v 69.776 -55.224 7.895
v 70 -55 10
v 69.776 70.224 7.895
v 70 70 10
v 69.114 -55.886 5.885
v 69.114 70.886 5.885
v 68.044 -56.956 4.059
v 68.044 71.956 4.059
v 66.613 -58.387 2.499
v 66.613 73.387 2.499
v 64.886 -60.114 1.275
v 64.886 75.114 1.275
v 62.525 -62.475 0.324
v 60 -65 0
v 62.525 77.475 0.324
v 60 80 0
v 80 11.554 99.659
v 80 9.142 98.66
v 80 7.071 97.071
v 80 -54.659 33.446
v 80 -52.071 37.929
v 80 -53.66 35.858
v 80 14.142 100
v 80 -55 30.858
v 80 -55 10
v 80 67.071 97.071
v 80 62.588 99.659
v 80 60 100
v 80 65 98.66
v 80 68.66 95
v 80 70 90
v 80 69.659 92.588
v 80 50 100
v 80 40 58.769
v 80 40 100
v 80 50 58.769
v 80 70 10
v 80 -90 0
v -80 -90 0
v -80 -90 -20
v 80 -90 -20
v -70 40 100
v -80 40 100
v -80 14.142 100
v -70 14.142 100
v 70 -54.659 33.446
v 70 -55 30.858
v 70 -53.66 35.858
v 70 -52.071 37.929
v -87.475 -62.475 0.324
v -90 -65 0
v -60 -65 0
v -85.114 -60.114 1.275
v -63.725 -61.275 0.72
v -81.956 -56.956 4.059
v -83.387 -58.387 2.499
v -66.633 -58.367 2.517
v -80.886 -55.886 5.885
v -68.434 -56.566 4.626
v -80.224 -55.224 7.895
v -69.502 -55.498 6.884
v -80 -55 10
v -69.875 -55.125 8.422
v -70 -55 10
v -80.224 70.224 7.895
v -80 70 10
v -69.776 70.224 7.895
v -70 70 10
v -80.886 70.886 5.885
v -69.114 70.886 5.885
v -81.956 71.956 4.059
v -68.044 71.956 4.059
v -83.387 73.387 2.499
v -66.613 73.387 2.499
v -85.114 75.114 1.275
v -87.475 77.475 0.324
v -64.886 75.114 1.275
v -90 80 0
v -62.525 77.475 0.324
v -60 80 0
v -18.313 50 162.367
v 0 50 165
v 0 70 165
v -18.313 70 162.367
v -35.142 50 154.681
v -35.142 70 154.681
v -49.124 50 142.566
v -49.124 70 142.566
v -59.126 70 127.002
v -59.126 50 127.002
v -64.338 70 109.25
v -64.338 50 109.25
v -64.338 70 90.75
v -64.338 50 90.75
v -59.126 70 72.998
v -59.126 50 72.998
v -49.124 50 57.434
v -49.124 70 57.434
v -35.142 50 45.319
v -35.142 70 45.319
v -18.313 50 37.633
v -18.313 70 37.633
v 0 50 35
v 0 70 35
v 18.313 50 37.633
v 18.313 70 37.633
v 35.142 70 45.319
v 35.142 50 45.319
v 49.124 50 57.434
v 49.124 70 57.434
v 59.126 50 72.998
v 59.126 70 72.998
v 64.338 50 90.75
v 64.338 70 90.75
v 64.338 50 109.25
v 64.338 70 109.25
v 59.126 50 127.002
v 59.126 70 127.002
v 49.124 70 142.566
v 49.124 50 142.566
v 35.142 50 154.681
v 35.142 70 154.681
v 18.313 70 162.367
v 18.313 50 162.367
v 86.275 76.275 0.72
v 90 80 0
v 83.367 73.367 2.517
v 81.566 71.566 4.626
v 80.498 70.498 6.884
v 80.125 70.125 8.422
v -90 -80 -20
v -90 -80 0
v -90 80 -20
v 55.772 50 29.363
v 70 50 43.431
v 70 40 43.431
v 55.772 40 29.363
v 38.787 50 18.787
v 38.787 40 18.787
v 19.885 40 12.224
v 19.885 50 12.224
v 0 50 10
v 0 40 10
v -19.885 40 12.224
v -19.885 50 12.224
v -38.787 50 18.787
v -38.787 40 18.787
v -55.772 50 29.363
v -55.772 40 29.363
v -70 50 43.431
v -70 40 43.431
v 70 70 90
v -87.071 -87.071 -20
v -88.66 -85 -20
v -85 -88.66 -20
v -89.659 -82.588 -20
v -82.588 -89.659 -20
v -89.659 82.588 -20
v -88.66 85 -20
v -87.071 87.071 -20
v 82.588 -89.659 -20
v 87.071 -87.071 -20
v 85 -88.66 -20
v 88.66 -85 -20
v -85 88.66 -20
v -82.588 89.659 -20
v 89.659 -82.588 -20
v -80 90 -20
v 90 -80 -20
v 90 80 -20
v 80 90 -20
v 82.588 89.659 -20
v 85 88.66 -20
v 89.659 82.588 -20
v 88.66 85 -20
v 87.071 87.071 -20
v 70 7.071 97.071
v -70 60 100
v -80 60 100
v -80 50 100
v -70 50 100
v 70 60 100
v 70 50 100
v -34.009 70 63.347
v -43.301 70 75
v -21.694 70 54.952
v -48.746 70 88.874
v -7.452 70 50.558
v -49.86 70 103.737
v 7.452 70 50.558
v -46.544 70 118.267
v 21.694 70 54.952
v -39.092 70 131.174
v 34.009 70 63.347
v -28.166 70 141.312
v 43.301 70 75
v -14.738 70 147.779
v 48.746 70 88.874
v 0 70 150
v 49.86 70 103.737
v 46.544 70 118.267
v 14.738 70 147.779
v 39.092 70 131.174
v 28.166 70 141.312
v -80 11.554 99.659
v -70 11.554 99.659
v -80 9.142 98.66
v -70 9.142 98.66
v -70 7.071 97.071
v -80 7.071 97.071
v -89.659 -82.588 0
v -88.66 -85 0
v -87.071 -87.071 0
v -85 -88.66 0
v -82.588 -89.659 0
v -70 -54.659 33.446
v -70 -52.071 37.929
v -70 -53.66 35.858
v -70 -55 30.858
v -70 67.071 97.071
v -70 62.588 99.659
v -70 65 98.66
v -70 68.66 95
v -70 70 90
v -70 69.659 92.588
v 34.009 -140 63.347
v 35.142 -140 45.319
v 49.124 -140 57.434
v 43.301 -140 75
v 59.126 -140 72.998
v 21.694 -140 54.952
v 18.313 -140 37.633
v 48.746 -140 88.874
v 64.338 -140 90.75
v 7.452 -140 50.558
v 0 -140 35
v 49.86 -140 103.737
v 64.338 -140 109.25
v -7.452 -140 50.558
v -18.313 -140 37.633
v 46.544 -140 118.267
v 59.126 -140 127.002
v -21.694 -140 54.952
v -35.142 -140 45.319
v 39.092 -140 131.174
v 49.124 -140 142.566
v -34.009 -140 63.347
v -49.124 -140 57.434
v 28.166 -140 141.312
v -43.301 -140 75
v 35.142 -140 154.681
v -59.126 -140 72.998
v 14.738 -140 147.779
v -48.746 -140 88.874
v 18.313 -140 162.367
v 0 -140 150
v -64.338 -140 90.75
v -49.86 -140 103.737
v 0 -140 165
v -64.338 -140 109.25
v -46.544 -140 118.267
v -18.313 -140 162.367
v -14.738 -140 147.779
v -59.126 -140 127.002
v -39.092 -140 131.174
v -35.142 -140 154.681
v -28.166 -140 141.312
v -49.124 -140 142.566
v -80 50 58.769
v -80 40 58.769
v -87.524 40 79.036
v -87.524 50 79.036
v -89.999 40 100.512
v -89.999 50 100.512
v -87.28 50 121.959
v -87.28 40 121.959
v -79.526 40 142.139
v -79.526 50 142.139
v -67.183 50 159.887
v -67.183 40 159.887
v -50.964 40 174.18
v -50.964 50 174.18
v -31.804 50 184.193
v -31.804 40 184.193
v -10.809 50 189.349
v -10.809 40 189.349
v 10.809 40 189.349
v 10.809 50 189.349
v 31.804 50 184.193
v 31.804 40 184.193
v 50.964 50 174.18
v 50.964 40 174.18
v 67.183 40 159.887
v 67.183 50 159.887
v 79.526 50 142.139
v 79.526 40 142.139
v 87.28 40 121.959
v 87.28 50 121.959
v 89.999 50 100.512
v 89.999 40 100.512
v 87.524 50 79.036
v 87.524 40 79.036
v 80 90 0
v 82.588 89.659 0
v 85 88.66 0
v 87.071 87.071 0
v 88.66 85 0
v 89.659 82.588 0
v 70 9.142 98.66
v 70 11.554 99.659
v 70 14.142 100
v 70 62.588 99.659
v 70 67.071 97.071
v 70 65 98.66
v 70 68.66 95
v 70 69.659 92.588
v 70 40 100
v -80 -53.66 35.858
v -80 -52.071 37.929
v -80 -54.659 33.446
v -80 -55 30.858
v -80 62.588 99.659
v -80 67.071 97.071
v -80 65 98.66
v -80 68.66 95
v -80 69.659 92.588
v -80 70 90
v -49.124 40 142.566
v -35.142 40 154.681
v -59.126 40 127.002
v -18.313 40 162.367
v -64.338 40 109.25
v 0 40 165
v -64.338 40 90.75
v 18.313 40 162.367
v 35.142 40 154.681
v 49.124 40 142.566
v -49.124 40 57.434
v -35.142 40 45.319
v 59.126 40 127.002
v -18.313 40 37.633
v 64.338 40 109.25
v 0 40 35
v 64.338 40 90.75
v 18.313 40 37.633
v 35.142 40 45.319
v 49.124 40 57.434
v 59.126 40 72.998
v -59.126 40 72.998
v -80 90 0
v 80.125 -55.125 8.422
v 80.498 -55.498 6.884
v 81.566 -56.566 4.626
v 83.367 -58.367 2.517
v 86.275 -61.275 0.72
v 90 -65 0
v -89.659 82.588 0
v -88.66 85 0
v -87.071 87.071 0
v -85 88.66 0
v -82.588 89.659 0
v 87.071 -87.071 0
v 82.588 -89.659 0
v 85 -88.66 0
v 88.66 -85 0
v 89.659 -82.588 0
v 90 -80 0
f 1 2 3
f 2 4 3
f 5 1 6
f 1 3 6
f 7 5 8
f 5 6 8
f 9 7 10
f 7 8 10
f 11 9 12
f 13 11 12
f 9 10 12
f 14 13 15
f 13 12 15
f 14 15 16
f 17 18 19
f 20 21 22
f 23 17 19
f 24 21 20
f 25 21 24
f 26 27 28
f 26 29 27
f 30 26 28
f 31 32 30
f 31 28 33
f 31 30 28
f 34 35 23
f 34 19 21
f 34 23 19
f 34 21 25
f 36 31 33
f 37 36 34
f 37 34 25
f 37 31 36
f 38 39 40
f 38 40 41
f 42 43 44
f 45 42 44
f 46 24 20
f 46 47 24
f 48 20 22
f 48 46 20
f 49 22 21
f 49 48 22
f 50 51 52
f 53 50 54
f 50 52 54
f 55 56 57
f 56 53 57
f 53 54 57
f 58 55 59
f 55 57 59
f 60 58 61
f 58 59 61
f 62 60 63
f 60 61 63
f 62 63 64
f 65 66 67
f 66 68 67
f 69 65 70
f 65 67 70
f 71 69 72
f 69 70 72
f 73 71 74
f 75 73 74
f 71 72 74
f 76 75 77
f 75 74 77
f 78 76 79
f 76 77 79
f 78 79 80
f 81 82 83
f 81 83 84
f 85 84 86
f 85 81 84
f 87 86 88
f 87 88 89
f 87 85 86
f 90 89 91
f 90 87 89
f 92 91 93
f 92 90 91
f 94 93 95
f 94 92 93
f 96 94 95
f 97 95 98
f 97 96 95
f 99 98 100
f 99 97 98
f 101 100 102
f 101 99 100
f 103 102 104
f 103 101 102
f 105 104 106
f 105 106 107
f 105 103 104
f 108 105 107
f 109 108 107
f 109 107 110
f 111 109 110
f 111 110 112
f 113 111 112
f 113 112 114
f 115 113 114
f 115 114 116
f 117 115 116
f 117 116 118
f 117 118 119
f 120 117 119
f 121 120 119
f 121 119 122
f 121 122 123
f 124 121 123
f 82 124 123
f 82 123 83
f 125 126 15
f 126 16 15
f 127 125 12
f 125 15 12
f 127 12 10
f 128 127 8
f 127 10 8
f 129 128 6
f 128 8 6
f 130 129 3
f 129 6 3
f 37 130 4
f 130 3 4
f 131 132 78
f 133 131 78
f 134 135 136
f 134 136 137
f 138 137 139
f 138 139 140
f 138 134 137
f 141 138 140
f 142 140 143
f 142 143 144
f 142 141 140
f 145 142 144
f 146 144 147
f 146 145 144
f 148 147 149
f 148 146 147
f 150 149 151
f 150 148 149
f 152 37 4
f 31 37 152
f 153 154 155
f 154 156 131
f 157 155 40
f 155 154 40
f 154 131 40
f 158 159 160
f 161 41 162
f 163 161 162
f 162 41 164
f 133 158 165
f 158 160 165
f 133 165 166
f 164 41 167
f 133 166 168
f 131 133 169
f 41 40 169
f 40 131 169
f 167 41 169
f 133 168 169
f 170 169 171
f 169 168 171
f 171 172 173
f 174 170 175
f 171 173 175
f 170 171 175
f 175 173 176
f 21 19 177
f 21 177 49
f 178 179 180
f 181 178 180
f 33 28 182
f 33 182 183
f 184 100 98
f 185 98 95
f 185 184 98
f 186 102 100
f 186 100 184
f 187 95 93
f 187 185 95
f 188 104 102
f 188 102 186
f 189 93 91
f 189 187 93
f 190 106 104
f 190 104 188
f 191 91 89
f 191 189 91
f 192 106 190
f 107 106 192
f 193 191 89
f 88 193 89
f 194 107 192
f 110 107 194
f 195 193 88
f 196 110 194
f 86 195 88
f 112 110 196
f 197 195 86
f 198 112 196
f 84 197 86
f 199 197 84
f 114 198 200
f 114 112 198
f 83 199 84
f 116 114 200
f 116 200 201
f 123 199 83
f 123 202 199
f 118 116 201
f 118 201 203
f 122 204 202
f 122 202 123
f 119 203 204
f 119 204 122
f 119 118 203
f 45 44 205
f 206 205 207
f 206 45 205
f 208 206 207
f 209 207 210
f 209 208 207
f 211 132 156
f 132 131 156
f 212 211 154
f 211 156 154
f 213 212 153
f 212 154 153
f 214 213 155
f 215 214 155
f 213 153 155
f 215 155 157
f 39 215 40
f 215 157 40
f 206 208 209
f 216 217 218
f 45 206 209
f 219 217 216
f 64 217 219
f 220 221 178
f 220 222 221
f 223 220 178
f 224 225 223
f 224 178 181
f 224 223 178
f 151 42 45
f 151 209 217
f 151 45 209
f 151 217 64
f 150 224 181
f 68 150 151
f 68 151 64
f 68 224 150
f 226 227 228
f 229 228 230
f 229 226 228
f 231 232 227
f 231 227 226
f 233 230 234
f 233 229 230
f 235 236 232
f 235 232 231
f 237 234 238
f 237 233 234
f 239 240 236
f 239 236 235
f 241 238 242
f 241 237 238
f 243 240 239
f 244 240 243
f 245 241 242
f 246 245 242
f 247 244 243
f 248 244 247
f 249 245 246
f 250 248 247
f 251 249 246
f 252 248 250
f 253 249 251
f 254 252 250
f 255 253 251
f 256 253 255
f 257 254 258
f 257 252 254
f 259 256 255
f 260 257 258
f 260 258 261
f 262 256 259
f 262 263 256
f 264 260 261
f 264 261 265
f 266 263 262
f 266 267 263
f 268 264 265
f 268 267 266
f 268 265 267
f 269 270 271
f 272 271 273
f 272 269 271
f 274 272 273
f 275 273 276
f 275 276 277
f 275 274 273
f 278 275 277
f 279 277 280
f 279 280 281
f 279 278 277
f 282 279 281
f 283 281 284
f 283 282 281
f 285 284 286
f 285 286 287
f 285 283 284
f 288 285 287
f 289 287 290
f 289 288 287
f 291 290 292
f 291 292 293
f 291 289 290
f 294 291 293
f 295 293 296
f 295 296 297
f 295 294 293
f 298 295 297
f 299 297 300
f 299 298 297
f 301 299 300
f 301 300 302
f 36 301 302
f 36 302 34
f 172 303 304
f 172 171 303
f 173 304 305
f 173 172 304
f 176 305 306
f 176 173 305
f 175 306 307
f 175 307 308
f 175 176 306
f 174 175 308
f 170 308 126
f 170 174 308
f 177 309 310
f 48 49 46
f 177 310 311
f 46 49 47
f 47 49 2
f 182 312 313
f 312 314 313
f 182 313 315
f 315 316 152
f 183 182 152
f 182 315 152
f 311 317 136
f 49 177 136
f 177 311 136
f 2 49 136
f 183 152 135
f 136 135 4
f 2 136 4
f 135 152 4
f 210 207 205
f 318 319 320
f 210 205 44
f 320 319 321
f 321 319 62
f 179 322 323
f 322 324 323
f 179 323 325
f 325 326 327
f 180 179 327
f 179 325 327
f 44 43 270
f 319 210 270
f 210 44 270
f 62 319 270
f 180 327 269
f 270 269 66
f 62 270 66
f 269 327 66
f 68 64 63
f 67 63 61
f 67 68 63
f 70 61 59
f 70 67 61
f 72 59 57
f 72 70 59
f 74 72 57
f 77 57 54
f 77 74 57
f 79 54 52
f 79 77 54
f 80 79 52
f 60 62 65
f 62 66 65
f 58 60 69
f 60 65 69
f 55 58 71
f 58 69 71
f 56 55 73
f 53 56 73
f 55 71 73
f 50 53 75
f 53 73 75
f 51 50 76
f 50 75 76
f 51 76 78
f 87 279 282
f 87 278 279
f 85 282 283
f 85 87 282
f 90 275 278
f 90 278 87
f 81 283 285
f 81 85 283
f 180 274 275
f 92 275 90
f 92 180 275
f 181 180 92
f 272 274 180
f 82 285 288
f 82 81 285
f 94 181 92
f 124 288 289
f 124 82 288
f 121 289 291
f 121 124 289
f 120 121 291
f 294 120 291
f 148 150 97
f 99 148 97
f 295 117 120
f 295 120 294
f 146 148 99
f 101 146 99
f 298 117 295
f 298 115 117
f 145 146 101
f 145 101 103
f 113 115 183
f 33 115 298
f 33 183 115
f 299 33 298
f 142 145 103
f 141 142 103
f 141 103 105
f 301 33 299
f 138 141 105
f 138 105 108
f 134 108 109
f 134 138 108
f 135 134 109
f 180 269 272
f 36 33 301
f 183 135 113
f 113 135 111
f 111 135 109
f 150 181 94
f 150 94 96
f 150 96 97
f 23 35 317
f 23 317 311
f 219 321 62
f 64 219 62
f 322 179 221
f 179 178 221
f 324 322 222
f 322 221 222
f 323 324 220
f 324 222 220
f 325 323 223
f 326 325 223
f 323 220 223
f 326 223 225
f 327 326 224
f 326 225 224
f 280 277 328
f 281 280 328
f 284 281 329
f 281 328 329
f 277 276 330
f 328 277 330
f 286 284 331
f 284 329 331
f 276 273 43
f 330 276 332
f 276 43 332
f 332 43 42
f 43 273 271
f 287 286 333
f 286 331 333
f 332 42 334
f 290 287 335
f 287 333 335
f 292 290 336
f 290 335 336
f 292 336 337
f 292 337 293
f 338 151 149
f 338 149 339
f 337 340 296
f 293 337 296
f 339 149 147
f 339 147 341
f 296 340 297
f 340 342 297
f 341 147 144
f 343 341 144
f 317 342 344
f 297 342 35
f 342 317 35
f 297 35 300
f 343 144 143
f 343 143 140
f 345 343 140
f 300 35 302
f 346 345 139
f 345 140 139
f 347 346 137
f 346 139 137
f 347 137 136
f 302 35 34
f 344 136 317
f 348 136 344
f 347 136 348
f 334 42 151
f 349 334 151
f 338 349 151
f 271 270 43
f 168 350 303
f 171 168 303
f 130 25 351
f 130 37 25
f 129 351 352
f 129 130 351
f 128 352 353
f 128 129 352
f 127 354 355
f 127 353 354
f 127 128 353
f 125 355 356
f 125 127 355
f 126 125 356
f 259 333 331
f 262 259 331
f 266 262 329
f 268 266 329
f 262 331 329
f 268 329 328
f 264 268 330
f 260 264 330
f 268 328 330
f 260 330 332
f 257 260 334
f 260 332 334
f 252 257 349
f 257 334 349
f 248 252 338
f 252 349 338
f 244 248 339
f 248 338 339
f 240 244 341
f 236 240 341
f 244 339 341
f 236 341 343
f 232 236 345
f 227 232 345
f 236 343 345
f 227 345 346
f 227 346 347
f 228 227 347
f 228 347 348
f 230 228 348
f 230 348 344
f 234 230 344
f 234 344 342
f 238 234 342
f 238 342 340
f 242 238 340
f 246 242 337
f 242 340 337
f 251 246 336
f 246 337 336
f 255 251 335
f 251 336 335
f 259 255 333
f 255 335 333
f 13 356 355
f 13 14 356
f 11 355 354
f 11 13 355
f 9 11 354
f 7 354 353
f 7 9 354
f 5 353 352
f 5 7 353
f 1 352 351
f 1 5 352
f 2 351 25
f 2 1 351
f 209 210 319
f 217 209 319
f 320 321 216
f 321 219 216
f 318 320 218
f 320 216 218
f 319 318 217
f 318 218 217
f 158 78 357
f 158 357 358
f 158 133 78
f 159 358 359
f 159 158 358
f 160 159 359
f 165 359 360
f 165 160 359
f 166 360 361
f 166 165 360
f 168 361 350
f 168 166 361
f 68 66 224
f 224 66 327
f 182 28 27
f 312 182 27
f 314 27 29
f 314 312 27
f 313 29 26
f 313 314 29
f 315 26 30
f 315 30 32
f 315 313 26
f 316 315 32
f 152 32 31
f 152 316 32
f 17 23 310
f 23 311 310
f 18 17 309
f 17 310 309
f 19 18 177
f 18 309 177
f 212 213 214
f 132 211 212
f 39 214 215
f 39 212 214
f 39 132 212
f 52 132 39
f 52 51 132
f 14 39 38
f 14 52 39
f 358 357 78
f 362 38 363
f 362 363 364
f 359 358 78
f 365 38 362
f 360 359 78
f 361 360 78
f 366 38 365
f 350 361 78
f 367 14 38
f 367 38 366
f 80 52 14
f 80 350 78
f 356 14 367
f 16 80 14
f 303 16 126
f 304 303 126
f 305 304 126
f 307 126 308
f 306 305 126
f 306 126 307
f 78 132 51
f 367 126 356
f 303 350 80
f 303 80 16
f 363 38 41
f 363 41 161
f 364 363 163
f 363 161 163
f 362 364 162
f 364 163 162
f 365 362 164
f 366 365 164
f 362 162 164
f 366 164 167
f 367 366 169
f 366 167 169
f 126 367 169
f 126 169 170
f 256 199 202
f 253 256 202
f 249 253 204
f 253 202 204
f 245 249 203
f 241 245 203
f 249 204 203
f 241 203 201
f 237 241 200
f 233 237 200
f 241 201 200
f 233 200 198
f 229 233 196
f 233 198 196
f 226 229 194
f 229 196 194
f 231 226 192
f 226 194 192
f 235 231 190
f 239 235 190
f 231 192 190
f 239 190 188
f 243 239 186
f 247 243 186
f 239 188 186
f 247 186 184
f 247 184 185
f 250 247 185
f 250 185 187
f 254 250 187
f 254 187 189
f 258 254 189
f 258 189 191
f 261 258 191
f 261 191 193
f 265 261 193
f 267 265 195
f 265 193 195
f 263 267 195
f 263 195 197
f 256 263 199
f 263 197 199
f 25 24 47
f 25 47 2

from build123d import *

# Parameters (mm, degrees)
BASE_SKETCH_W                   = 180
BASE_SKETCH_H                   = 180
BASE_EXTRUDE_DEPTH              = 20
SUPPORT_EXTRUDE_DEPTH           = 10
MOTOR_SUPPORT_SKETCH_R          = 90
MOTOR_SUPPORT_EXTRUDE_DEPTH     = 10
MOTOR_SKETCH_R                  = 65
MOTOR_EXTRUDE_DEPTH             = 180
MOTOR_EXTRUDE_DIRECTION_2_REACH = 249.184
MOTOR_HOLE_SKETCH_R             = 50
MOTOR_HOLE_CUT_DEPTH            = 210
SUPPORT_FILLETS_R               = 10


with BuildPart() as part:
    # Base Sketch → Base Extrude (new body)
    with BuildSketch(Plane.XY):
        Rectangle(BASE_SKETCH_W, BASE_SKETCH_H)
    extrude(amount=-BASE_EXTRUDE_DEPTH)

    # Support Sketch → Support Extrude (add)
    with BuildSketch(Plane(origin=(80, 0, 0), x_dir=(0, 0, -1), z_dir=(1, 0, 0))):
        Polygon((-100, 10), (-35, -55), (0, -55), (0, 70), (-100, 70), align=None)
    support_extrude = extrude(amount=-SUPPORT_EXTRUDE_DEPTH)

    # Support Mirror: Support Extrude across plane
    add(support_extrude.mirror(Plane(origin=(0, 0, 0), x_dir=(0, 0, 1), z_dir=(1, 0, 0))))

    # Motor Support Sketch → Motor Support Extrude (add)
    with BuildSketch(Plane(origin=(0, 50, 0), x_dir=(1, 0, 0), z_dir=(0, 1, 0))):
        with Locations((0, -100)):
            Circle(MOTOR_SUPPORT_SKETCH_R)
    extrude(amount=-MOTOR_SUPPORT_EXTRUDE_DEPTH)

    # Motor Sketch → Motor Extrude (add)
    with BuildSketch(Plane.XZ.offset(-40)):
        with Locations(Location((0, 100, 0), (0, 0, 90))):
            Circle(MOTOR_SKETCH_R)
    extrude(amount=MOTOR_EXTRUDE_DEPTH)

    # Motor Extrude direction 2: up to this face of the body (flat: up to its plane)
    motor_extrude_direction_2_end = Plane(part.part.faces().sort_by_distance((75, 70, 50))[0])
    # Motor Sketch → Motor Extrude direction 2 (add, up to the picked face)
    with BuildSketch(Plane.XZ.offset(-40), mode=Mode.PRIVATE) as motor_extrude_direction_2_sk1:
        with Locations(Location((0, 100, 0), (0, 0, 90))):
            Circle(MOTOR_SKETCH_R)
    motor_extrude_direction_2_tool1 = split(extrude(motor_extrude_direction_2_sk1.sketch, amount=-MOTOR_EXTRUDE_DIRECTION_2_REACH, mode=Mode.PRIVATE), bisect_by=motor_extrude_direction_2_end, keep=Keep.BOTH, mode=Mode.PRIVATE)
    add(motor_extrude_direction_2_tool1.solids().sort_by(Axis((0, 40, 100), (0, 1, 0)))[0])

    # Motor Hole Sketch → Motor Hole Cut (cut)
    with BuildSketch(Plane(origin=(0, 70, 0), x_dir=(1, 0, 0), z_dir=(0, 1, 0))):
        with Locations(Location((0, -100, 0), (0, 0, 270))):
            Circle(MOTOR_HOLE_SKETCH_R)
    extrude(amount=-MOTOR_HOLE_CUT_DEPTH, mode=Mode.SUBTRACT)

    # Support Fillets
    support_fillets_edges = [part.edges().sort_by_distance(p)[0] for p in [
        (75, 10, 100),
        (75, 70, 100),
        (70, 7.5, 0),
        (75, 70, 0),
        (75, -55, 0),
        (75, -55, 35),
        (80, 7.5, 0),
        (-75, 70, 100),
        (-75, 10, 100),
        (-75, -55, 35),
        (-80, 7.5, 0),
        (-75, -55, 0),
        (-75, 70, 0),
        (-70, 7.5, 0),
        (90, -90, -10),
        (-90, -90, -10),
        (-90, 90, -10),
        (90, 90, -10),
    ]]
    fillet(support_fillets_edges, radius=SUPPORT_FILLETS_R - 0.0001)  # a hair under: the kernel refuses the full size


solid = part.part
